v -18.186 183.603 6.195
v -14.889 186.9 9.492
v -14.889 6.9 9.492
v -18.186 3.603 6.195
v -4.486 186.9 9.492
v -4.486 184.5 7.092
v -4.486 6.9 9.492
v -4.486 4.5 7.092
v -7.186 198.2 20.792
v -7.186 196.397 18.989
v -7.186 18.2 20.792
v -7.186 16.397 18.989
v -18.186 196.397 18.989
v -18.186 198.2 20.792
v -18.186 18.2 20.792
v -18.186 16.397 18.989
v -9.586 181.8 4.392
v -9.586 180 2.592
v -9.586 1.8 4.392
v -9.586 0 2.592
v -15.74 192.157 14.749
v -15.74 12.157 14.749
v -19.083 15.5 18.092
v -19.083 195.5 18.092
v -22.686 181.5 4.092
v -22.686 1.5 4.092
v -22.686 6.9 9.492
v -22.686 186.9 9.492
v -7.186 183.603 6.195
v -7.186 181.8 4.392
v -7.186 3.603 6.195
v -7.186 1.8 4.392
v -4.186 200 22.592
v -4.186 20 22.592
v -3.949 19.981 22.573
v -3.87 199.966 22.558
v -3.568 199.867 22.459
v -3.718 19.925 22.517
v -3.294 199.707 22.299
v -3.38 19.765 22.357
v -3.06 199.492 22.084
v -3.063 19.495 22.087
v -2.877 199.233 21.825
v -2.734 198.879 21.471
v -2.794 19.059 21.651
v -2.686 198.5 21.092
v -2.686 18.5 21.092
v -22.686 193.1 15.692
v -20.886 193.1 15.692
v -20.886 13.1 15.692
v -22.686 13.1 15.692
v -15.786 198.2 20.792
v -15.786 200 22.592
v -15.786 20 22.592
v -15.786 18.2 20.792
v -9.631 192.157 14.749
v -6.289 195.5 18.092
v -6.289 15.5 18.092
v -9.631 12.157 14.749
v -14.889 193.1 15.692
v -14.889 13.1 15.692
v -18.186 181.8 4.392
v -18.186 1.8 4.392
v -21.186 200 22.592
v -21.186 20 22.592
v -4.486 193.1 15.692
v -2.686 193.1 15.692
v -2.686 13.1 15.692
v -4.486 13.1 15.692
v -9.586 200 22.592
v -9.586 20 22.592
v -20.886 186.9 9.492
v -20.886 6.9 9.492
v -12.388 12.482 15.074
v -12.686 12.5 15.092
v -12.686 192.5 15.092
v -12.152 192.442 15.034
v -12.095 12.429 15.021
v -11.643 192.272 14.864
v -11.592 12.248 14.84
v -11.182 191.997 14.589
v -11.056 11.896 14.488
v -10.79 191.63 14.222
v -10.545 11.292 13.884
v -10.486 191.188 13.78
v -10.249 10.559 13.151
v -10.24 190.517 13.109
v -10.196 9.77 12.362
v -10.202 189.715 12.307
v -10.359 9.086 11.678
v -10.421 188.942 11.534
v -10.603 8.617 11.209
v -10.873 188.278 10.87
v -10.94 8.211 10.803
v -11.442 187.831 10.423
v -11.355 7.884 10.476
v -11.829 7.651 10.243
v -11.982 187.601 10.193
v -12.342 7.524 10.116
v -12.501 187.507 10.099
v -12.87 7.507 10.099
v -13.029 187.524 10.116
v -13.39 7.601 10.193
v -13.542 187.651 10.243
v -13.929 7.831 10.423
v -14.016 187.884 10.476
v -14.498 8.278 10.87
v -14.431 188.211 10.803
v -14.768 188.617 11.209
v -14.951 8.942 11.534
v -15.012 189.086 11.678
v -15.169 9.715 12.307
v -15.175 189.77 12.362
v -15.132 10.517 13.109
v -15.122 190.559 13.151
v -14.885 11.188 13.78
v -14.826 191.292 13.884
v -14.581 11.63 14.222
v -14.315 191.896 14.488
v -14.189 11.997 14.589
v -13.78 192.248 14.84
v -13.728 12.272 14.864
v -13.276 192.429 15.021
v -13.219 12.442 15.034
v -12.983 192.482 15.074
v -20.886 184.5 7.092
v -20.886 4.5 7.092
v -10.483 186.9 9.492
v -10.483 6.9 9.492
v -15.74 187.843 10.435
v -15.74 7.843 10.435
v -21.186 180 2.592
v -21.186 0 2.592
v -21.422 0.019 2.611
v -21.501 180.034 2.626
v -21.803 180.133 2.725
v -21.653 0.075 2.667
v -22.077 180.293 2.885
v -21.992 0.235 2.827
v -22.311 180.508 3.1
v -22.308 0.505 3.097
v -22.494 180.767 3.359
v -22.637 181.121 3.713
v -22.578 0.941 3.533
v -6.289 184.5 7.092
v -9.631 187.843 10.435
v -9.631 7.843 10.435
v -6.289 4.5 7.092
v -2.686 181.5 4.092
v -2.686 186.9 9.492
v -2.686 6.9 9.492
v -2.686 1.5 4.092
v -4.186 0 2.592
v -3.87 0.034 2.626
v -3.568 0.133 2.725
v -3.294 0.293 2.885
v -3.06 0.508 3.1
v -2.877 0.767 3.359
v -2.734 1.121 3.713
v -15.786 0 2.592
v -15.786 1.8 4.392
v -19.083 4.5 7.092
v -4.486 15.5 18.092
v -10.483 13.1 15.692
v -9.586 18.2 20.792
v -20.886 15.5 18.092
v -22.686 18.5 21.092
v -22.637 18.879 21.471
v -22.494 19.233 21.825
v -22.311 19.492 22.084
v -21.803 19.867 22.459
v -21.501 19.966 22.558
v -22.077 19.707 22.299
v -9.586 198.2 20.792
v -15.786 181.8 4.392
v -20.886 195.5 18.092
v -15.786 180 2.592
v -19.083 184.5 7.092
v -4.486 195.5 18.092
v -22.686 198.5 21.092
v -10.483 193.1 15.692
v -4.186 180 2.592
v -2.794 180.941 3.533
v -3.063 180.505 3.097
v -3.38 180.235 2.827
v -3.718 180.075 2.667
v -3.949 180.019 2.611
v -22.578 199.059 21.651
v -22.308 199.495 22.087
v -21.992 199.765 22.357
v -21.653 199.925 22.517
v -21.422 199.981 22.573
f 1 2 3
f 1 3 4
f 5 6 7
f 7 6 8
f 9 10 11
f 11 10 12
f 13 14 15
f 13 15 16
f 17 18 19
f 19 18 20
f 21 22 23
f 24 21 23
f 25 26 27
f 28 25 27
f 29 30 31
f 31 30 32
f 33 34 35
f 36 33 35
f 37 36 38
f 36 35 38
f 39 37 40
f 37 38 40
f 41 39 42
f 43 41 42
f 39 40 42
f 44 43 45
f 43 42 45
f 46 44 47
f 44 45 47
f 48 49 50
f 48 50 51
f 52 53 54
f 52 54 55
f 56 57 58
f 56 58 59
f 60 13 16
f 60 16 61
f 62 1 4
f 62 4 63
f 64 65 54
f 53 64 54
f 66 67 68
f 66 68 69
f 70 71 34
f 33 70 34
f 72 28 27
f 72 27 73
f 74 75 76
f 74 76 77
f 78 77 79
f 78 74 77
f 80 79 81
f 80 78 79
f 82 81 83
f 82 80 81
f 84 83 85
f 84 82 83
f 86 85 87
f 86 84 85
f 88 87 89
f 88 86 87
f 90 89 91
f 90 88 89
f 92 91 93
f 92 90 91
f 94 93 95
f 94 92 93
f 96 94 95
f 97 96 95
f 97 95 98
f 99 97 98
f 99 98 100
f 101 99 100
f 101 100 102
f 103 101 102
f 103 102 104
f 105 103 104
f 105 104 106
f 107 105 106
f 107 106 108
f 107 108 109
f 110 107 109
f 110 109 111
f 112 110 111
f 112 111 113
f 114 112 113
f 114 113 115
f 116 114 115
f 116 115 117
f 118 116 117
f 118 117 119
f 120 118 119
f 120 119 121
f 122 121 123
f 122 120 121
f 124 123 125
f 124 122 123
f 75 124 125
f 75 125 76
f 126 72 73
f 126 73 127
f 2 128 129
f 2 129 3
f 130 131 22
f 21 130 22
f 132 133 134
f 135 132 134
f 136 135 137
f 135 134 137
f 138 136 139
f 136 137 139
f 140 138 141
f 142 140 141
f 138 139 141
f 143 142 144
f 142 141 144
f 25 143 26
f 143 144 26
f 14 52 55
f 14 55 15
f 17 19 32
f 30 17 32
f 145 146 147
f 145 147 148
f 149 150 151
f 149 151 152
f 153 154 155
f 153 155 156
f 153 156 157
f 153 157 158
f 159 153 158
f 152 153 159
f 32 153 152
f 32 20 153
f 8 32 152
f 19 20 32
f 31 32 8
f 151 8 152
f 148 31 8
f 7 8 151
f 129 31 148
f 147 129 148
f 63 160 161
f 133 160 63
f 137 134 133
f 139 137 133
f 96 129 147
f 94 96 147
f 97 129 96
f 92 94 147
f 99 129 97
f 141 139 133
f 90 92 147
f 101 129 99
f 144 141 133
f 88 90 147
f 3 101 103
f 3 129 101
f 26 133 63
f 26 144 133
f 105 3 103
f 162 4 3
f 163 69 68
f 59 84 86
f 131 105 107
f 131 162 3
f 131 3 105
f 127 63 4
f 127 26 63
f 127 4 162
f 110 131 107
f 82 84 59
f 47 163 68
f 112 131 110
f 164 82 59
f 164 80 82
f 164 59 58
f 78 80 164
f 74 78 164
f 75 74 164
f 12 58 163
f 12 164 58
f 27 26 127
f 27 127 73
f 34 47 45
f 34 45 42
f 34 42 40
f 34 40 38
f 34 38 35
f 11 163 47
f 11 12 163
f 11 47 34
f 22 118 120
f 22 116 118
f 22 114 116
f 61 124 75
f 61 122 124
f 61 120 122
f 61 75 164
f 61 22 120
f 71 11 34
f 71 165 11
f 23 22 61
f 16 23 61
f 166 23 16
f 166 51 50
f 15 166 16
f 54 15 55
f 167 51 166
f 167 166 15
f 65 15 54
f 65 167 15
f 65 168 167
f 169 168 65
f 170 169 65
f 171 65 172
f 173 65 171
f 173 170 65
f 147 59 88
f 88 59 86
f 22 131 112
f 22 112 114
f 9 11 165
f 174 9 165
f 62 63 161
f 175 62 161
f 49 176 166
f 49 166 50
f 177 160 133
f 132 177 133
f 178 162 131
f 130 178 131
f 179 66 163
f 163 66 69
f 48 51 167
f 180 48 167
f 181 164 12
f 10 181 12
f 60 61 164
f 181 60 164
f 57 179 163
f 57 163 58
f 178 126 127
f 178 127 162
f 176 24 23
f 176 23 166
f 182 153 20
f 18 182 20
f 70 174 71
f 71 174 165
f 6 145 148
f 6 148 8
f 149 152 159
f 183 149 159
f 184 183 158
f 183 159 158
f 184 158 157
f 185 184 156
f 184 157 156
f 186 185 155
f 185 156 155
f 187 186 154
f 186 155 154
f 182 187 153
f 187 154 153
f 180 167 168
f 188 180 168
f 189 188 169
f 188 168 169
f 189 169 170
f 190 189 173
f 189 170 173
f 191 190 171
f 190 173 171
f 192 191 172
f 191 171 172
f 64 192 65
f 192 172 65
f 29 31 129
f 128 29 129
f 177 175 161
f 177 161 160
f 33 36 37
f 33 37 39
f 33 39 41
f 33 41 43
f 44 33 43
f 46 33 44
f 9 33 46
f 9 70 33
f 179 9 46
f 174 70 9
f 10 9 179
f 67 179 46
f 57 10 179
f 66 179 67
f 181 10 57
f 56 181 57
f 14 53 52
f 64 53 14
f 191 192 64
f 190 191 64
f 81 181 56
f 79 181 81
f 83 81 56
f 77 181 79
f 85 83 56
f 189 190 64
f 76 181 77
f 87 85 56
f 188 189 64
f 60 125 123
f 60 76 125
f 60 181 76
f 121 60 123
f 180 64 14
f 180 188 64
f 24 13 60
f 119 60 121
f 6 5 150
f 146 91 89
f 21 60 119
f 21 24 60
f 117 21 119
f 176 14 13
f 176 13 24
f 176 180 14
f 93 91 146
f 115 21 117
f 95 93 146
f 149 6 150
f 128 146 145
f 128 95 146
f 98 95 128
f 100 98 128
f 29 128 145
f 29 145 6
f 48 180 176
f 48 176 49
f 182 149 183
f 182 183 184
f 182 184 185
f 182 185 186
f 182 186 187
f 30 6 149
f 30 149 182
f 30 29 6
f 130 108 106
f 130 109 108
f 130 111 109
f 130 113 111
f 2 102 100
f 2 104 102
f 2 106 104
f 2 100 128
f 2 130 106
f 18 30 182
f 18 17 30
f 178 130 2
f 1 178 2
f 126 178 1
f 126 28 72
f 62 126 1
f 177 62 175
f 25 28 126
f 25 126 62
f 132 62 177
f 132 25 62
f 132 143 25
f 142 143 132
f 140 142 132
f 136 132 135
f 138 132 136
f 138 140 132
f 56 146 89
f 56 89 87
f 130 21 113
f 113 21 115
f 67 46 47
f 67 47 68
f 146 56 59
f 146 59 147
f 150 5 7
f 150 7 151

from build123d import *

# Parameters (mm, degrees)
SKETCH_1_R          = 2.5
EXTRUDE_1_DEPTH     = 200
CUT_EXTRUDE_6_DEPTH = 90
CUT_EXTRUDE_7_DEPTH = 203.263183999


with BuildPart() as part:
    # 草图1 → 凸台-拉伸1 (new body)
    with BuildSketch(Plane(origin=(0, 0, 0), x_dir=(1, 0, 0), z_dir=(0, 1, 0))):
        with BuildLine():
            Line((-20.885583918, -15.691936644), (-22.685583918, -15.691936644))
            Line((-22.685583918, -15.691936644), (-22.685583918, -21.091936644))
            ThreePointArc((-22.685583918, -21.091936644), (-22.24624409, -22.152596816), (-21.185583918, -22.591936644))
            Line((-21.185583918, -22.591936644), (-15.785583918, -22.591936644))
            Line((-15.785583918, -22.591936644), (-15.785583918, -20.791936644))
            Line((-15.785583918, -20.791936644), (-18.185583918, -20.791936644))
            Line((-18.185583918, -20.791936644), (-18.185583918, -18.988986799))
            Line((-18.185583918, -18.988986799), (-14.888533763, -15.691936644))
            Line((-14.888533763, -15.691936644), (-10.482634073, -15.691936644))
            Line((-10.482634073, -15.691936644), (-7.185583918, -18.988986799))
            Line((-7.185583918, -18.988986799), (-7.185583918, -20.791936644))
            Line((-7.185583918, -20.791936644), (-9.585583918, -20.791936644))
            Line((-9.585583918, -20.791936644), (-9.585583918, -22.591936644))
            Line((-9.585583918, -22.591936644), (-4.185583918, -22.591936644))
            ThreePointArc((-4.185583918, -22.591936644), (-3.124923747, -22.152596816), (-2.685583918, -21.091936644))
            Line((-2.685583918, -21.091936644), (-2.685583918, -15.691936644))
            Line((-2.685583918, -15.691936644), (-4.485583918, -15.691936644))
            Line((-4.485583918, -15.691936644), (-4.485583918, -18.091936644))
            Line((-4.485583918, -18.091936644), (-6.288533763, -18.091936644))
            Line((-6.288533763, -18.091936644), (-9.631456898, -14.749013509))
            Line((-9.631456898, -14.749013509), (-9.631456898, -10.434859779))
            Line((-9.631456898, -10.434859779), (-6.288533763, -7.091936644))
            Line((-6.288533763, -7.091936644), (-4.485583918, -7.091936644))
            Line((-4.485583918, -7.091936644), (-4.485583918, -9.491936644))
            Line((-4.485583918, -9.491936644), (-2.685583918, -9.491936644))
            Line((-2.685583918, -9.491936644), (-2.685583918, -4.091936644))
            ThreePointArc((-2.685583918, -4.091936644), (-3.124923747, -3.031276473), (-4.185583918, -2.591936644))
            Line((-4.185583918, -2.591936644), (-9.585583918, -2.591936644))
            Line((-9.585583918, -2.591936644), (-9.585583918, -4.391936644))
            Line((-9.585583918, -4.391936644), (-7.185583918, -4.391936644))
            Line((-7.185583918, -4.391936644), (-7.185583918, -6.194886489))
            Line((-7.185583918, -6.194886489), (-10.482634073, -9.491936644))
            Line((-10.482634073, -9.491936644), (-14.888533763, -9.491936644))
            Line((-14.888533763, -9.491936644), (-18.185583918, -6.194886489))
            Line((-18.185583918, -6.194886489), (-18.185583918, -4.391936644))
            Line((-18.185583918, -4.391936644), (-15.785583918, -4.391936644))
            Line((-15.785583918, -4.391936644), (-15.785583918, -2.591936644))
            Line((-15.785583918, -2.591936644), (-21.185583918, -2.591936644))
            ThreePointArc((-21.185583918, -2.591936644), (-22.24624409, -3.031276473), (-22.685583918, -4.091936644))
            Line((-22.685583918, -4.091936644), (-22.685583918, -9.491936644))
            Line((-22.685583918, -9.491936644), (-20.885583918, -9.491936644))
            Line((-20.885583918, -9.491936644), (-20.885583918, -7.091936644))
            Line((-20.885583918, -7.091936644), (-19.082634073, -7.091936644))
            Line((-19.082634073, -7.091936644), (-15.739710939, -10.434859779))
            Line((-15.739710939, -10.434859779), (-15.739710939, -14.749013509))
            Line((-15.739710939, -14.749013509), (-19.082634073, -18.091936644))
            Line((-19.082634073, -18.091936644), (-20.885583918, -18.091936644))
            Line((-20.885583918, -18.091936644), (-20.885583918, -15.691936644))
        make_face()
        with Locations(Location((-12.685583918, -12.591936644, 0), (0, 0, 270))):
            Circle(SKETCH_1_R, mode=Mode.SUBTRACT)
    extrude(amount=EXTRUDE_1_DEPTH)

    # 草图4 → 切除-拉伸6 (cut)
    with BuildSketch(Plane.ZY.offset(22.685583918)):
        Polygon((22.591936644, 200), (2.591936644, 180), (2.591936644, 200), align=None)
    extrude(amount=-CUT_EXTRUDE_6_DEPTH, mode=Mode.SUBTRACT)

    # 草图5 → 切除-拉伸7 (cut, through all)
    with BuildSketch(Plane.ZY.offset(22.685583918)):
        Polygon((2.591936644, 0), (22.591936644, 20), (22.591936644, 0), align=None)
    extrude(amount=-CUT_EXTRUDE_7_DEPTH, mode=Mode.SUBTRACT)


solid = part.part
